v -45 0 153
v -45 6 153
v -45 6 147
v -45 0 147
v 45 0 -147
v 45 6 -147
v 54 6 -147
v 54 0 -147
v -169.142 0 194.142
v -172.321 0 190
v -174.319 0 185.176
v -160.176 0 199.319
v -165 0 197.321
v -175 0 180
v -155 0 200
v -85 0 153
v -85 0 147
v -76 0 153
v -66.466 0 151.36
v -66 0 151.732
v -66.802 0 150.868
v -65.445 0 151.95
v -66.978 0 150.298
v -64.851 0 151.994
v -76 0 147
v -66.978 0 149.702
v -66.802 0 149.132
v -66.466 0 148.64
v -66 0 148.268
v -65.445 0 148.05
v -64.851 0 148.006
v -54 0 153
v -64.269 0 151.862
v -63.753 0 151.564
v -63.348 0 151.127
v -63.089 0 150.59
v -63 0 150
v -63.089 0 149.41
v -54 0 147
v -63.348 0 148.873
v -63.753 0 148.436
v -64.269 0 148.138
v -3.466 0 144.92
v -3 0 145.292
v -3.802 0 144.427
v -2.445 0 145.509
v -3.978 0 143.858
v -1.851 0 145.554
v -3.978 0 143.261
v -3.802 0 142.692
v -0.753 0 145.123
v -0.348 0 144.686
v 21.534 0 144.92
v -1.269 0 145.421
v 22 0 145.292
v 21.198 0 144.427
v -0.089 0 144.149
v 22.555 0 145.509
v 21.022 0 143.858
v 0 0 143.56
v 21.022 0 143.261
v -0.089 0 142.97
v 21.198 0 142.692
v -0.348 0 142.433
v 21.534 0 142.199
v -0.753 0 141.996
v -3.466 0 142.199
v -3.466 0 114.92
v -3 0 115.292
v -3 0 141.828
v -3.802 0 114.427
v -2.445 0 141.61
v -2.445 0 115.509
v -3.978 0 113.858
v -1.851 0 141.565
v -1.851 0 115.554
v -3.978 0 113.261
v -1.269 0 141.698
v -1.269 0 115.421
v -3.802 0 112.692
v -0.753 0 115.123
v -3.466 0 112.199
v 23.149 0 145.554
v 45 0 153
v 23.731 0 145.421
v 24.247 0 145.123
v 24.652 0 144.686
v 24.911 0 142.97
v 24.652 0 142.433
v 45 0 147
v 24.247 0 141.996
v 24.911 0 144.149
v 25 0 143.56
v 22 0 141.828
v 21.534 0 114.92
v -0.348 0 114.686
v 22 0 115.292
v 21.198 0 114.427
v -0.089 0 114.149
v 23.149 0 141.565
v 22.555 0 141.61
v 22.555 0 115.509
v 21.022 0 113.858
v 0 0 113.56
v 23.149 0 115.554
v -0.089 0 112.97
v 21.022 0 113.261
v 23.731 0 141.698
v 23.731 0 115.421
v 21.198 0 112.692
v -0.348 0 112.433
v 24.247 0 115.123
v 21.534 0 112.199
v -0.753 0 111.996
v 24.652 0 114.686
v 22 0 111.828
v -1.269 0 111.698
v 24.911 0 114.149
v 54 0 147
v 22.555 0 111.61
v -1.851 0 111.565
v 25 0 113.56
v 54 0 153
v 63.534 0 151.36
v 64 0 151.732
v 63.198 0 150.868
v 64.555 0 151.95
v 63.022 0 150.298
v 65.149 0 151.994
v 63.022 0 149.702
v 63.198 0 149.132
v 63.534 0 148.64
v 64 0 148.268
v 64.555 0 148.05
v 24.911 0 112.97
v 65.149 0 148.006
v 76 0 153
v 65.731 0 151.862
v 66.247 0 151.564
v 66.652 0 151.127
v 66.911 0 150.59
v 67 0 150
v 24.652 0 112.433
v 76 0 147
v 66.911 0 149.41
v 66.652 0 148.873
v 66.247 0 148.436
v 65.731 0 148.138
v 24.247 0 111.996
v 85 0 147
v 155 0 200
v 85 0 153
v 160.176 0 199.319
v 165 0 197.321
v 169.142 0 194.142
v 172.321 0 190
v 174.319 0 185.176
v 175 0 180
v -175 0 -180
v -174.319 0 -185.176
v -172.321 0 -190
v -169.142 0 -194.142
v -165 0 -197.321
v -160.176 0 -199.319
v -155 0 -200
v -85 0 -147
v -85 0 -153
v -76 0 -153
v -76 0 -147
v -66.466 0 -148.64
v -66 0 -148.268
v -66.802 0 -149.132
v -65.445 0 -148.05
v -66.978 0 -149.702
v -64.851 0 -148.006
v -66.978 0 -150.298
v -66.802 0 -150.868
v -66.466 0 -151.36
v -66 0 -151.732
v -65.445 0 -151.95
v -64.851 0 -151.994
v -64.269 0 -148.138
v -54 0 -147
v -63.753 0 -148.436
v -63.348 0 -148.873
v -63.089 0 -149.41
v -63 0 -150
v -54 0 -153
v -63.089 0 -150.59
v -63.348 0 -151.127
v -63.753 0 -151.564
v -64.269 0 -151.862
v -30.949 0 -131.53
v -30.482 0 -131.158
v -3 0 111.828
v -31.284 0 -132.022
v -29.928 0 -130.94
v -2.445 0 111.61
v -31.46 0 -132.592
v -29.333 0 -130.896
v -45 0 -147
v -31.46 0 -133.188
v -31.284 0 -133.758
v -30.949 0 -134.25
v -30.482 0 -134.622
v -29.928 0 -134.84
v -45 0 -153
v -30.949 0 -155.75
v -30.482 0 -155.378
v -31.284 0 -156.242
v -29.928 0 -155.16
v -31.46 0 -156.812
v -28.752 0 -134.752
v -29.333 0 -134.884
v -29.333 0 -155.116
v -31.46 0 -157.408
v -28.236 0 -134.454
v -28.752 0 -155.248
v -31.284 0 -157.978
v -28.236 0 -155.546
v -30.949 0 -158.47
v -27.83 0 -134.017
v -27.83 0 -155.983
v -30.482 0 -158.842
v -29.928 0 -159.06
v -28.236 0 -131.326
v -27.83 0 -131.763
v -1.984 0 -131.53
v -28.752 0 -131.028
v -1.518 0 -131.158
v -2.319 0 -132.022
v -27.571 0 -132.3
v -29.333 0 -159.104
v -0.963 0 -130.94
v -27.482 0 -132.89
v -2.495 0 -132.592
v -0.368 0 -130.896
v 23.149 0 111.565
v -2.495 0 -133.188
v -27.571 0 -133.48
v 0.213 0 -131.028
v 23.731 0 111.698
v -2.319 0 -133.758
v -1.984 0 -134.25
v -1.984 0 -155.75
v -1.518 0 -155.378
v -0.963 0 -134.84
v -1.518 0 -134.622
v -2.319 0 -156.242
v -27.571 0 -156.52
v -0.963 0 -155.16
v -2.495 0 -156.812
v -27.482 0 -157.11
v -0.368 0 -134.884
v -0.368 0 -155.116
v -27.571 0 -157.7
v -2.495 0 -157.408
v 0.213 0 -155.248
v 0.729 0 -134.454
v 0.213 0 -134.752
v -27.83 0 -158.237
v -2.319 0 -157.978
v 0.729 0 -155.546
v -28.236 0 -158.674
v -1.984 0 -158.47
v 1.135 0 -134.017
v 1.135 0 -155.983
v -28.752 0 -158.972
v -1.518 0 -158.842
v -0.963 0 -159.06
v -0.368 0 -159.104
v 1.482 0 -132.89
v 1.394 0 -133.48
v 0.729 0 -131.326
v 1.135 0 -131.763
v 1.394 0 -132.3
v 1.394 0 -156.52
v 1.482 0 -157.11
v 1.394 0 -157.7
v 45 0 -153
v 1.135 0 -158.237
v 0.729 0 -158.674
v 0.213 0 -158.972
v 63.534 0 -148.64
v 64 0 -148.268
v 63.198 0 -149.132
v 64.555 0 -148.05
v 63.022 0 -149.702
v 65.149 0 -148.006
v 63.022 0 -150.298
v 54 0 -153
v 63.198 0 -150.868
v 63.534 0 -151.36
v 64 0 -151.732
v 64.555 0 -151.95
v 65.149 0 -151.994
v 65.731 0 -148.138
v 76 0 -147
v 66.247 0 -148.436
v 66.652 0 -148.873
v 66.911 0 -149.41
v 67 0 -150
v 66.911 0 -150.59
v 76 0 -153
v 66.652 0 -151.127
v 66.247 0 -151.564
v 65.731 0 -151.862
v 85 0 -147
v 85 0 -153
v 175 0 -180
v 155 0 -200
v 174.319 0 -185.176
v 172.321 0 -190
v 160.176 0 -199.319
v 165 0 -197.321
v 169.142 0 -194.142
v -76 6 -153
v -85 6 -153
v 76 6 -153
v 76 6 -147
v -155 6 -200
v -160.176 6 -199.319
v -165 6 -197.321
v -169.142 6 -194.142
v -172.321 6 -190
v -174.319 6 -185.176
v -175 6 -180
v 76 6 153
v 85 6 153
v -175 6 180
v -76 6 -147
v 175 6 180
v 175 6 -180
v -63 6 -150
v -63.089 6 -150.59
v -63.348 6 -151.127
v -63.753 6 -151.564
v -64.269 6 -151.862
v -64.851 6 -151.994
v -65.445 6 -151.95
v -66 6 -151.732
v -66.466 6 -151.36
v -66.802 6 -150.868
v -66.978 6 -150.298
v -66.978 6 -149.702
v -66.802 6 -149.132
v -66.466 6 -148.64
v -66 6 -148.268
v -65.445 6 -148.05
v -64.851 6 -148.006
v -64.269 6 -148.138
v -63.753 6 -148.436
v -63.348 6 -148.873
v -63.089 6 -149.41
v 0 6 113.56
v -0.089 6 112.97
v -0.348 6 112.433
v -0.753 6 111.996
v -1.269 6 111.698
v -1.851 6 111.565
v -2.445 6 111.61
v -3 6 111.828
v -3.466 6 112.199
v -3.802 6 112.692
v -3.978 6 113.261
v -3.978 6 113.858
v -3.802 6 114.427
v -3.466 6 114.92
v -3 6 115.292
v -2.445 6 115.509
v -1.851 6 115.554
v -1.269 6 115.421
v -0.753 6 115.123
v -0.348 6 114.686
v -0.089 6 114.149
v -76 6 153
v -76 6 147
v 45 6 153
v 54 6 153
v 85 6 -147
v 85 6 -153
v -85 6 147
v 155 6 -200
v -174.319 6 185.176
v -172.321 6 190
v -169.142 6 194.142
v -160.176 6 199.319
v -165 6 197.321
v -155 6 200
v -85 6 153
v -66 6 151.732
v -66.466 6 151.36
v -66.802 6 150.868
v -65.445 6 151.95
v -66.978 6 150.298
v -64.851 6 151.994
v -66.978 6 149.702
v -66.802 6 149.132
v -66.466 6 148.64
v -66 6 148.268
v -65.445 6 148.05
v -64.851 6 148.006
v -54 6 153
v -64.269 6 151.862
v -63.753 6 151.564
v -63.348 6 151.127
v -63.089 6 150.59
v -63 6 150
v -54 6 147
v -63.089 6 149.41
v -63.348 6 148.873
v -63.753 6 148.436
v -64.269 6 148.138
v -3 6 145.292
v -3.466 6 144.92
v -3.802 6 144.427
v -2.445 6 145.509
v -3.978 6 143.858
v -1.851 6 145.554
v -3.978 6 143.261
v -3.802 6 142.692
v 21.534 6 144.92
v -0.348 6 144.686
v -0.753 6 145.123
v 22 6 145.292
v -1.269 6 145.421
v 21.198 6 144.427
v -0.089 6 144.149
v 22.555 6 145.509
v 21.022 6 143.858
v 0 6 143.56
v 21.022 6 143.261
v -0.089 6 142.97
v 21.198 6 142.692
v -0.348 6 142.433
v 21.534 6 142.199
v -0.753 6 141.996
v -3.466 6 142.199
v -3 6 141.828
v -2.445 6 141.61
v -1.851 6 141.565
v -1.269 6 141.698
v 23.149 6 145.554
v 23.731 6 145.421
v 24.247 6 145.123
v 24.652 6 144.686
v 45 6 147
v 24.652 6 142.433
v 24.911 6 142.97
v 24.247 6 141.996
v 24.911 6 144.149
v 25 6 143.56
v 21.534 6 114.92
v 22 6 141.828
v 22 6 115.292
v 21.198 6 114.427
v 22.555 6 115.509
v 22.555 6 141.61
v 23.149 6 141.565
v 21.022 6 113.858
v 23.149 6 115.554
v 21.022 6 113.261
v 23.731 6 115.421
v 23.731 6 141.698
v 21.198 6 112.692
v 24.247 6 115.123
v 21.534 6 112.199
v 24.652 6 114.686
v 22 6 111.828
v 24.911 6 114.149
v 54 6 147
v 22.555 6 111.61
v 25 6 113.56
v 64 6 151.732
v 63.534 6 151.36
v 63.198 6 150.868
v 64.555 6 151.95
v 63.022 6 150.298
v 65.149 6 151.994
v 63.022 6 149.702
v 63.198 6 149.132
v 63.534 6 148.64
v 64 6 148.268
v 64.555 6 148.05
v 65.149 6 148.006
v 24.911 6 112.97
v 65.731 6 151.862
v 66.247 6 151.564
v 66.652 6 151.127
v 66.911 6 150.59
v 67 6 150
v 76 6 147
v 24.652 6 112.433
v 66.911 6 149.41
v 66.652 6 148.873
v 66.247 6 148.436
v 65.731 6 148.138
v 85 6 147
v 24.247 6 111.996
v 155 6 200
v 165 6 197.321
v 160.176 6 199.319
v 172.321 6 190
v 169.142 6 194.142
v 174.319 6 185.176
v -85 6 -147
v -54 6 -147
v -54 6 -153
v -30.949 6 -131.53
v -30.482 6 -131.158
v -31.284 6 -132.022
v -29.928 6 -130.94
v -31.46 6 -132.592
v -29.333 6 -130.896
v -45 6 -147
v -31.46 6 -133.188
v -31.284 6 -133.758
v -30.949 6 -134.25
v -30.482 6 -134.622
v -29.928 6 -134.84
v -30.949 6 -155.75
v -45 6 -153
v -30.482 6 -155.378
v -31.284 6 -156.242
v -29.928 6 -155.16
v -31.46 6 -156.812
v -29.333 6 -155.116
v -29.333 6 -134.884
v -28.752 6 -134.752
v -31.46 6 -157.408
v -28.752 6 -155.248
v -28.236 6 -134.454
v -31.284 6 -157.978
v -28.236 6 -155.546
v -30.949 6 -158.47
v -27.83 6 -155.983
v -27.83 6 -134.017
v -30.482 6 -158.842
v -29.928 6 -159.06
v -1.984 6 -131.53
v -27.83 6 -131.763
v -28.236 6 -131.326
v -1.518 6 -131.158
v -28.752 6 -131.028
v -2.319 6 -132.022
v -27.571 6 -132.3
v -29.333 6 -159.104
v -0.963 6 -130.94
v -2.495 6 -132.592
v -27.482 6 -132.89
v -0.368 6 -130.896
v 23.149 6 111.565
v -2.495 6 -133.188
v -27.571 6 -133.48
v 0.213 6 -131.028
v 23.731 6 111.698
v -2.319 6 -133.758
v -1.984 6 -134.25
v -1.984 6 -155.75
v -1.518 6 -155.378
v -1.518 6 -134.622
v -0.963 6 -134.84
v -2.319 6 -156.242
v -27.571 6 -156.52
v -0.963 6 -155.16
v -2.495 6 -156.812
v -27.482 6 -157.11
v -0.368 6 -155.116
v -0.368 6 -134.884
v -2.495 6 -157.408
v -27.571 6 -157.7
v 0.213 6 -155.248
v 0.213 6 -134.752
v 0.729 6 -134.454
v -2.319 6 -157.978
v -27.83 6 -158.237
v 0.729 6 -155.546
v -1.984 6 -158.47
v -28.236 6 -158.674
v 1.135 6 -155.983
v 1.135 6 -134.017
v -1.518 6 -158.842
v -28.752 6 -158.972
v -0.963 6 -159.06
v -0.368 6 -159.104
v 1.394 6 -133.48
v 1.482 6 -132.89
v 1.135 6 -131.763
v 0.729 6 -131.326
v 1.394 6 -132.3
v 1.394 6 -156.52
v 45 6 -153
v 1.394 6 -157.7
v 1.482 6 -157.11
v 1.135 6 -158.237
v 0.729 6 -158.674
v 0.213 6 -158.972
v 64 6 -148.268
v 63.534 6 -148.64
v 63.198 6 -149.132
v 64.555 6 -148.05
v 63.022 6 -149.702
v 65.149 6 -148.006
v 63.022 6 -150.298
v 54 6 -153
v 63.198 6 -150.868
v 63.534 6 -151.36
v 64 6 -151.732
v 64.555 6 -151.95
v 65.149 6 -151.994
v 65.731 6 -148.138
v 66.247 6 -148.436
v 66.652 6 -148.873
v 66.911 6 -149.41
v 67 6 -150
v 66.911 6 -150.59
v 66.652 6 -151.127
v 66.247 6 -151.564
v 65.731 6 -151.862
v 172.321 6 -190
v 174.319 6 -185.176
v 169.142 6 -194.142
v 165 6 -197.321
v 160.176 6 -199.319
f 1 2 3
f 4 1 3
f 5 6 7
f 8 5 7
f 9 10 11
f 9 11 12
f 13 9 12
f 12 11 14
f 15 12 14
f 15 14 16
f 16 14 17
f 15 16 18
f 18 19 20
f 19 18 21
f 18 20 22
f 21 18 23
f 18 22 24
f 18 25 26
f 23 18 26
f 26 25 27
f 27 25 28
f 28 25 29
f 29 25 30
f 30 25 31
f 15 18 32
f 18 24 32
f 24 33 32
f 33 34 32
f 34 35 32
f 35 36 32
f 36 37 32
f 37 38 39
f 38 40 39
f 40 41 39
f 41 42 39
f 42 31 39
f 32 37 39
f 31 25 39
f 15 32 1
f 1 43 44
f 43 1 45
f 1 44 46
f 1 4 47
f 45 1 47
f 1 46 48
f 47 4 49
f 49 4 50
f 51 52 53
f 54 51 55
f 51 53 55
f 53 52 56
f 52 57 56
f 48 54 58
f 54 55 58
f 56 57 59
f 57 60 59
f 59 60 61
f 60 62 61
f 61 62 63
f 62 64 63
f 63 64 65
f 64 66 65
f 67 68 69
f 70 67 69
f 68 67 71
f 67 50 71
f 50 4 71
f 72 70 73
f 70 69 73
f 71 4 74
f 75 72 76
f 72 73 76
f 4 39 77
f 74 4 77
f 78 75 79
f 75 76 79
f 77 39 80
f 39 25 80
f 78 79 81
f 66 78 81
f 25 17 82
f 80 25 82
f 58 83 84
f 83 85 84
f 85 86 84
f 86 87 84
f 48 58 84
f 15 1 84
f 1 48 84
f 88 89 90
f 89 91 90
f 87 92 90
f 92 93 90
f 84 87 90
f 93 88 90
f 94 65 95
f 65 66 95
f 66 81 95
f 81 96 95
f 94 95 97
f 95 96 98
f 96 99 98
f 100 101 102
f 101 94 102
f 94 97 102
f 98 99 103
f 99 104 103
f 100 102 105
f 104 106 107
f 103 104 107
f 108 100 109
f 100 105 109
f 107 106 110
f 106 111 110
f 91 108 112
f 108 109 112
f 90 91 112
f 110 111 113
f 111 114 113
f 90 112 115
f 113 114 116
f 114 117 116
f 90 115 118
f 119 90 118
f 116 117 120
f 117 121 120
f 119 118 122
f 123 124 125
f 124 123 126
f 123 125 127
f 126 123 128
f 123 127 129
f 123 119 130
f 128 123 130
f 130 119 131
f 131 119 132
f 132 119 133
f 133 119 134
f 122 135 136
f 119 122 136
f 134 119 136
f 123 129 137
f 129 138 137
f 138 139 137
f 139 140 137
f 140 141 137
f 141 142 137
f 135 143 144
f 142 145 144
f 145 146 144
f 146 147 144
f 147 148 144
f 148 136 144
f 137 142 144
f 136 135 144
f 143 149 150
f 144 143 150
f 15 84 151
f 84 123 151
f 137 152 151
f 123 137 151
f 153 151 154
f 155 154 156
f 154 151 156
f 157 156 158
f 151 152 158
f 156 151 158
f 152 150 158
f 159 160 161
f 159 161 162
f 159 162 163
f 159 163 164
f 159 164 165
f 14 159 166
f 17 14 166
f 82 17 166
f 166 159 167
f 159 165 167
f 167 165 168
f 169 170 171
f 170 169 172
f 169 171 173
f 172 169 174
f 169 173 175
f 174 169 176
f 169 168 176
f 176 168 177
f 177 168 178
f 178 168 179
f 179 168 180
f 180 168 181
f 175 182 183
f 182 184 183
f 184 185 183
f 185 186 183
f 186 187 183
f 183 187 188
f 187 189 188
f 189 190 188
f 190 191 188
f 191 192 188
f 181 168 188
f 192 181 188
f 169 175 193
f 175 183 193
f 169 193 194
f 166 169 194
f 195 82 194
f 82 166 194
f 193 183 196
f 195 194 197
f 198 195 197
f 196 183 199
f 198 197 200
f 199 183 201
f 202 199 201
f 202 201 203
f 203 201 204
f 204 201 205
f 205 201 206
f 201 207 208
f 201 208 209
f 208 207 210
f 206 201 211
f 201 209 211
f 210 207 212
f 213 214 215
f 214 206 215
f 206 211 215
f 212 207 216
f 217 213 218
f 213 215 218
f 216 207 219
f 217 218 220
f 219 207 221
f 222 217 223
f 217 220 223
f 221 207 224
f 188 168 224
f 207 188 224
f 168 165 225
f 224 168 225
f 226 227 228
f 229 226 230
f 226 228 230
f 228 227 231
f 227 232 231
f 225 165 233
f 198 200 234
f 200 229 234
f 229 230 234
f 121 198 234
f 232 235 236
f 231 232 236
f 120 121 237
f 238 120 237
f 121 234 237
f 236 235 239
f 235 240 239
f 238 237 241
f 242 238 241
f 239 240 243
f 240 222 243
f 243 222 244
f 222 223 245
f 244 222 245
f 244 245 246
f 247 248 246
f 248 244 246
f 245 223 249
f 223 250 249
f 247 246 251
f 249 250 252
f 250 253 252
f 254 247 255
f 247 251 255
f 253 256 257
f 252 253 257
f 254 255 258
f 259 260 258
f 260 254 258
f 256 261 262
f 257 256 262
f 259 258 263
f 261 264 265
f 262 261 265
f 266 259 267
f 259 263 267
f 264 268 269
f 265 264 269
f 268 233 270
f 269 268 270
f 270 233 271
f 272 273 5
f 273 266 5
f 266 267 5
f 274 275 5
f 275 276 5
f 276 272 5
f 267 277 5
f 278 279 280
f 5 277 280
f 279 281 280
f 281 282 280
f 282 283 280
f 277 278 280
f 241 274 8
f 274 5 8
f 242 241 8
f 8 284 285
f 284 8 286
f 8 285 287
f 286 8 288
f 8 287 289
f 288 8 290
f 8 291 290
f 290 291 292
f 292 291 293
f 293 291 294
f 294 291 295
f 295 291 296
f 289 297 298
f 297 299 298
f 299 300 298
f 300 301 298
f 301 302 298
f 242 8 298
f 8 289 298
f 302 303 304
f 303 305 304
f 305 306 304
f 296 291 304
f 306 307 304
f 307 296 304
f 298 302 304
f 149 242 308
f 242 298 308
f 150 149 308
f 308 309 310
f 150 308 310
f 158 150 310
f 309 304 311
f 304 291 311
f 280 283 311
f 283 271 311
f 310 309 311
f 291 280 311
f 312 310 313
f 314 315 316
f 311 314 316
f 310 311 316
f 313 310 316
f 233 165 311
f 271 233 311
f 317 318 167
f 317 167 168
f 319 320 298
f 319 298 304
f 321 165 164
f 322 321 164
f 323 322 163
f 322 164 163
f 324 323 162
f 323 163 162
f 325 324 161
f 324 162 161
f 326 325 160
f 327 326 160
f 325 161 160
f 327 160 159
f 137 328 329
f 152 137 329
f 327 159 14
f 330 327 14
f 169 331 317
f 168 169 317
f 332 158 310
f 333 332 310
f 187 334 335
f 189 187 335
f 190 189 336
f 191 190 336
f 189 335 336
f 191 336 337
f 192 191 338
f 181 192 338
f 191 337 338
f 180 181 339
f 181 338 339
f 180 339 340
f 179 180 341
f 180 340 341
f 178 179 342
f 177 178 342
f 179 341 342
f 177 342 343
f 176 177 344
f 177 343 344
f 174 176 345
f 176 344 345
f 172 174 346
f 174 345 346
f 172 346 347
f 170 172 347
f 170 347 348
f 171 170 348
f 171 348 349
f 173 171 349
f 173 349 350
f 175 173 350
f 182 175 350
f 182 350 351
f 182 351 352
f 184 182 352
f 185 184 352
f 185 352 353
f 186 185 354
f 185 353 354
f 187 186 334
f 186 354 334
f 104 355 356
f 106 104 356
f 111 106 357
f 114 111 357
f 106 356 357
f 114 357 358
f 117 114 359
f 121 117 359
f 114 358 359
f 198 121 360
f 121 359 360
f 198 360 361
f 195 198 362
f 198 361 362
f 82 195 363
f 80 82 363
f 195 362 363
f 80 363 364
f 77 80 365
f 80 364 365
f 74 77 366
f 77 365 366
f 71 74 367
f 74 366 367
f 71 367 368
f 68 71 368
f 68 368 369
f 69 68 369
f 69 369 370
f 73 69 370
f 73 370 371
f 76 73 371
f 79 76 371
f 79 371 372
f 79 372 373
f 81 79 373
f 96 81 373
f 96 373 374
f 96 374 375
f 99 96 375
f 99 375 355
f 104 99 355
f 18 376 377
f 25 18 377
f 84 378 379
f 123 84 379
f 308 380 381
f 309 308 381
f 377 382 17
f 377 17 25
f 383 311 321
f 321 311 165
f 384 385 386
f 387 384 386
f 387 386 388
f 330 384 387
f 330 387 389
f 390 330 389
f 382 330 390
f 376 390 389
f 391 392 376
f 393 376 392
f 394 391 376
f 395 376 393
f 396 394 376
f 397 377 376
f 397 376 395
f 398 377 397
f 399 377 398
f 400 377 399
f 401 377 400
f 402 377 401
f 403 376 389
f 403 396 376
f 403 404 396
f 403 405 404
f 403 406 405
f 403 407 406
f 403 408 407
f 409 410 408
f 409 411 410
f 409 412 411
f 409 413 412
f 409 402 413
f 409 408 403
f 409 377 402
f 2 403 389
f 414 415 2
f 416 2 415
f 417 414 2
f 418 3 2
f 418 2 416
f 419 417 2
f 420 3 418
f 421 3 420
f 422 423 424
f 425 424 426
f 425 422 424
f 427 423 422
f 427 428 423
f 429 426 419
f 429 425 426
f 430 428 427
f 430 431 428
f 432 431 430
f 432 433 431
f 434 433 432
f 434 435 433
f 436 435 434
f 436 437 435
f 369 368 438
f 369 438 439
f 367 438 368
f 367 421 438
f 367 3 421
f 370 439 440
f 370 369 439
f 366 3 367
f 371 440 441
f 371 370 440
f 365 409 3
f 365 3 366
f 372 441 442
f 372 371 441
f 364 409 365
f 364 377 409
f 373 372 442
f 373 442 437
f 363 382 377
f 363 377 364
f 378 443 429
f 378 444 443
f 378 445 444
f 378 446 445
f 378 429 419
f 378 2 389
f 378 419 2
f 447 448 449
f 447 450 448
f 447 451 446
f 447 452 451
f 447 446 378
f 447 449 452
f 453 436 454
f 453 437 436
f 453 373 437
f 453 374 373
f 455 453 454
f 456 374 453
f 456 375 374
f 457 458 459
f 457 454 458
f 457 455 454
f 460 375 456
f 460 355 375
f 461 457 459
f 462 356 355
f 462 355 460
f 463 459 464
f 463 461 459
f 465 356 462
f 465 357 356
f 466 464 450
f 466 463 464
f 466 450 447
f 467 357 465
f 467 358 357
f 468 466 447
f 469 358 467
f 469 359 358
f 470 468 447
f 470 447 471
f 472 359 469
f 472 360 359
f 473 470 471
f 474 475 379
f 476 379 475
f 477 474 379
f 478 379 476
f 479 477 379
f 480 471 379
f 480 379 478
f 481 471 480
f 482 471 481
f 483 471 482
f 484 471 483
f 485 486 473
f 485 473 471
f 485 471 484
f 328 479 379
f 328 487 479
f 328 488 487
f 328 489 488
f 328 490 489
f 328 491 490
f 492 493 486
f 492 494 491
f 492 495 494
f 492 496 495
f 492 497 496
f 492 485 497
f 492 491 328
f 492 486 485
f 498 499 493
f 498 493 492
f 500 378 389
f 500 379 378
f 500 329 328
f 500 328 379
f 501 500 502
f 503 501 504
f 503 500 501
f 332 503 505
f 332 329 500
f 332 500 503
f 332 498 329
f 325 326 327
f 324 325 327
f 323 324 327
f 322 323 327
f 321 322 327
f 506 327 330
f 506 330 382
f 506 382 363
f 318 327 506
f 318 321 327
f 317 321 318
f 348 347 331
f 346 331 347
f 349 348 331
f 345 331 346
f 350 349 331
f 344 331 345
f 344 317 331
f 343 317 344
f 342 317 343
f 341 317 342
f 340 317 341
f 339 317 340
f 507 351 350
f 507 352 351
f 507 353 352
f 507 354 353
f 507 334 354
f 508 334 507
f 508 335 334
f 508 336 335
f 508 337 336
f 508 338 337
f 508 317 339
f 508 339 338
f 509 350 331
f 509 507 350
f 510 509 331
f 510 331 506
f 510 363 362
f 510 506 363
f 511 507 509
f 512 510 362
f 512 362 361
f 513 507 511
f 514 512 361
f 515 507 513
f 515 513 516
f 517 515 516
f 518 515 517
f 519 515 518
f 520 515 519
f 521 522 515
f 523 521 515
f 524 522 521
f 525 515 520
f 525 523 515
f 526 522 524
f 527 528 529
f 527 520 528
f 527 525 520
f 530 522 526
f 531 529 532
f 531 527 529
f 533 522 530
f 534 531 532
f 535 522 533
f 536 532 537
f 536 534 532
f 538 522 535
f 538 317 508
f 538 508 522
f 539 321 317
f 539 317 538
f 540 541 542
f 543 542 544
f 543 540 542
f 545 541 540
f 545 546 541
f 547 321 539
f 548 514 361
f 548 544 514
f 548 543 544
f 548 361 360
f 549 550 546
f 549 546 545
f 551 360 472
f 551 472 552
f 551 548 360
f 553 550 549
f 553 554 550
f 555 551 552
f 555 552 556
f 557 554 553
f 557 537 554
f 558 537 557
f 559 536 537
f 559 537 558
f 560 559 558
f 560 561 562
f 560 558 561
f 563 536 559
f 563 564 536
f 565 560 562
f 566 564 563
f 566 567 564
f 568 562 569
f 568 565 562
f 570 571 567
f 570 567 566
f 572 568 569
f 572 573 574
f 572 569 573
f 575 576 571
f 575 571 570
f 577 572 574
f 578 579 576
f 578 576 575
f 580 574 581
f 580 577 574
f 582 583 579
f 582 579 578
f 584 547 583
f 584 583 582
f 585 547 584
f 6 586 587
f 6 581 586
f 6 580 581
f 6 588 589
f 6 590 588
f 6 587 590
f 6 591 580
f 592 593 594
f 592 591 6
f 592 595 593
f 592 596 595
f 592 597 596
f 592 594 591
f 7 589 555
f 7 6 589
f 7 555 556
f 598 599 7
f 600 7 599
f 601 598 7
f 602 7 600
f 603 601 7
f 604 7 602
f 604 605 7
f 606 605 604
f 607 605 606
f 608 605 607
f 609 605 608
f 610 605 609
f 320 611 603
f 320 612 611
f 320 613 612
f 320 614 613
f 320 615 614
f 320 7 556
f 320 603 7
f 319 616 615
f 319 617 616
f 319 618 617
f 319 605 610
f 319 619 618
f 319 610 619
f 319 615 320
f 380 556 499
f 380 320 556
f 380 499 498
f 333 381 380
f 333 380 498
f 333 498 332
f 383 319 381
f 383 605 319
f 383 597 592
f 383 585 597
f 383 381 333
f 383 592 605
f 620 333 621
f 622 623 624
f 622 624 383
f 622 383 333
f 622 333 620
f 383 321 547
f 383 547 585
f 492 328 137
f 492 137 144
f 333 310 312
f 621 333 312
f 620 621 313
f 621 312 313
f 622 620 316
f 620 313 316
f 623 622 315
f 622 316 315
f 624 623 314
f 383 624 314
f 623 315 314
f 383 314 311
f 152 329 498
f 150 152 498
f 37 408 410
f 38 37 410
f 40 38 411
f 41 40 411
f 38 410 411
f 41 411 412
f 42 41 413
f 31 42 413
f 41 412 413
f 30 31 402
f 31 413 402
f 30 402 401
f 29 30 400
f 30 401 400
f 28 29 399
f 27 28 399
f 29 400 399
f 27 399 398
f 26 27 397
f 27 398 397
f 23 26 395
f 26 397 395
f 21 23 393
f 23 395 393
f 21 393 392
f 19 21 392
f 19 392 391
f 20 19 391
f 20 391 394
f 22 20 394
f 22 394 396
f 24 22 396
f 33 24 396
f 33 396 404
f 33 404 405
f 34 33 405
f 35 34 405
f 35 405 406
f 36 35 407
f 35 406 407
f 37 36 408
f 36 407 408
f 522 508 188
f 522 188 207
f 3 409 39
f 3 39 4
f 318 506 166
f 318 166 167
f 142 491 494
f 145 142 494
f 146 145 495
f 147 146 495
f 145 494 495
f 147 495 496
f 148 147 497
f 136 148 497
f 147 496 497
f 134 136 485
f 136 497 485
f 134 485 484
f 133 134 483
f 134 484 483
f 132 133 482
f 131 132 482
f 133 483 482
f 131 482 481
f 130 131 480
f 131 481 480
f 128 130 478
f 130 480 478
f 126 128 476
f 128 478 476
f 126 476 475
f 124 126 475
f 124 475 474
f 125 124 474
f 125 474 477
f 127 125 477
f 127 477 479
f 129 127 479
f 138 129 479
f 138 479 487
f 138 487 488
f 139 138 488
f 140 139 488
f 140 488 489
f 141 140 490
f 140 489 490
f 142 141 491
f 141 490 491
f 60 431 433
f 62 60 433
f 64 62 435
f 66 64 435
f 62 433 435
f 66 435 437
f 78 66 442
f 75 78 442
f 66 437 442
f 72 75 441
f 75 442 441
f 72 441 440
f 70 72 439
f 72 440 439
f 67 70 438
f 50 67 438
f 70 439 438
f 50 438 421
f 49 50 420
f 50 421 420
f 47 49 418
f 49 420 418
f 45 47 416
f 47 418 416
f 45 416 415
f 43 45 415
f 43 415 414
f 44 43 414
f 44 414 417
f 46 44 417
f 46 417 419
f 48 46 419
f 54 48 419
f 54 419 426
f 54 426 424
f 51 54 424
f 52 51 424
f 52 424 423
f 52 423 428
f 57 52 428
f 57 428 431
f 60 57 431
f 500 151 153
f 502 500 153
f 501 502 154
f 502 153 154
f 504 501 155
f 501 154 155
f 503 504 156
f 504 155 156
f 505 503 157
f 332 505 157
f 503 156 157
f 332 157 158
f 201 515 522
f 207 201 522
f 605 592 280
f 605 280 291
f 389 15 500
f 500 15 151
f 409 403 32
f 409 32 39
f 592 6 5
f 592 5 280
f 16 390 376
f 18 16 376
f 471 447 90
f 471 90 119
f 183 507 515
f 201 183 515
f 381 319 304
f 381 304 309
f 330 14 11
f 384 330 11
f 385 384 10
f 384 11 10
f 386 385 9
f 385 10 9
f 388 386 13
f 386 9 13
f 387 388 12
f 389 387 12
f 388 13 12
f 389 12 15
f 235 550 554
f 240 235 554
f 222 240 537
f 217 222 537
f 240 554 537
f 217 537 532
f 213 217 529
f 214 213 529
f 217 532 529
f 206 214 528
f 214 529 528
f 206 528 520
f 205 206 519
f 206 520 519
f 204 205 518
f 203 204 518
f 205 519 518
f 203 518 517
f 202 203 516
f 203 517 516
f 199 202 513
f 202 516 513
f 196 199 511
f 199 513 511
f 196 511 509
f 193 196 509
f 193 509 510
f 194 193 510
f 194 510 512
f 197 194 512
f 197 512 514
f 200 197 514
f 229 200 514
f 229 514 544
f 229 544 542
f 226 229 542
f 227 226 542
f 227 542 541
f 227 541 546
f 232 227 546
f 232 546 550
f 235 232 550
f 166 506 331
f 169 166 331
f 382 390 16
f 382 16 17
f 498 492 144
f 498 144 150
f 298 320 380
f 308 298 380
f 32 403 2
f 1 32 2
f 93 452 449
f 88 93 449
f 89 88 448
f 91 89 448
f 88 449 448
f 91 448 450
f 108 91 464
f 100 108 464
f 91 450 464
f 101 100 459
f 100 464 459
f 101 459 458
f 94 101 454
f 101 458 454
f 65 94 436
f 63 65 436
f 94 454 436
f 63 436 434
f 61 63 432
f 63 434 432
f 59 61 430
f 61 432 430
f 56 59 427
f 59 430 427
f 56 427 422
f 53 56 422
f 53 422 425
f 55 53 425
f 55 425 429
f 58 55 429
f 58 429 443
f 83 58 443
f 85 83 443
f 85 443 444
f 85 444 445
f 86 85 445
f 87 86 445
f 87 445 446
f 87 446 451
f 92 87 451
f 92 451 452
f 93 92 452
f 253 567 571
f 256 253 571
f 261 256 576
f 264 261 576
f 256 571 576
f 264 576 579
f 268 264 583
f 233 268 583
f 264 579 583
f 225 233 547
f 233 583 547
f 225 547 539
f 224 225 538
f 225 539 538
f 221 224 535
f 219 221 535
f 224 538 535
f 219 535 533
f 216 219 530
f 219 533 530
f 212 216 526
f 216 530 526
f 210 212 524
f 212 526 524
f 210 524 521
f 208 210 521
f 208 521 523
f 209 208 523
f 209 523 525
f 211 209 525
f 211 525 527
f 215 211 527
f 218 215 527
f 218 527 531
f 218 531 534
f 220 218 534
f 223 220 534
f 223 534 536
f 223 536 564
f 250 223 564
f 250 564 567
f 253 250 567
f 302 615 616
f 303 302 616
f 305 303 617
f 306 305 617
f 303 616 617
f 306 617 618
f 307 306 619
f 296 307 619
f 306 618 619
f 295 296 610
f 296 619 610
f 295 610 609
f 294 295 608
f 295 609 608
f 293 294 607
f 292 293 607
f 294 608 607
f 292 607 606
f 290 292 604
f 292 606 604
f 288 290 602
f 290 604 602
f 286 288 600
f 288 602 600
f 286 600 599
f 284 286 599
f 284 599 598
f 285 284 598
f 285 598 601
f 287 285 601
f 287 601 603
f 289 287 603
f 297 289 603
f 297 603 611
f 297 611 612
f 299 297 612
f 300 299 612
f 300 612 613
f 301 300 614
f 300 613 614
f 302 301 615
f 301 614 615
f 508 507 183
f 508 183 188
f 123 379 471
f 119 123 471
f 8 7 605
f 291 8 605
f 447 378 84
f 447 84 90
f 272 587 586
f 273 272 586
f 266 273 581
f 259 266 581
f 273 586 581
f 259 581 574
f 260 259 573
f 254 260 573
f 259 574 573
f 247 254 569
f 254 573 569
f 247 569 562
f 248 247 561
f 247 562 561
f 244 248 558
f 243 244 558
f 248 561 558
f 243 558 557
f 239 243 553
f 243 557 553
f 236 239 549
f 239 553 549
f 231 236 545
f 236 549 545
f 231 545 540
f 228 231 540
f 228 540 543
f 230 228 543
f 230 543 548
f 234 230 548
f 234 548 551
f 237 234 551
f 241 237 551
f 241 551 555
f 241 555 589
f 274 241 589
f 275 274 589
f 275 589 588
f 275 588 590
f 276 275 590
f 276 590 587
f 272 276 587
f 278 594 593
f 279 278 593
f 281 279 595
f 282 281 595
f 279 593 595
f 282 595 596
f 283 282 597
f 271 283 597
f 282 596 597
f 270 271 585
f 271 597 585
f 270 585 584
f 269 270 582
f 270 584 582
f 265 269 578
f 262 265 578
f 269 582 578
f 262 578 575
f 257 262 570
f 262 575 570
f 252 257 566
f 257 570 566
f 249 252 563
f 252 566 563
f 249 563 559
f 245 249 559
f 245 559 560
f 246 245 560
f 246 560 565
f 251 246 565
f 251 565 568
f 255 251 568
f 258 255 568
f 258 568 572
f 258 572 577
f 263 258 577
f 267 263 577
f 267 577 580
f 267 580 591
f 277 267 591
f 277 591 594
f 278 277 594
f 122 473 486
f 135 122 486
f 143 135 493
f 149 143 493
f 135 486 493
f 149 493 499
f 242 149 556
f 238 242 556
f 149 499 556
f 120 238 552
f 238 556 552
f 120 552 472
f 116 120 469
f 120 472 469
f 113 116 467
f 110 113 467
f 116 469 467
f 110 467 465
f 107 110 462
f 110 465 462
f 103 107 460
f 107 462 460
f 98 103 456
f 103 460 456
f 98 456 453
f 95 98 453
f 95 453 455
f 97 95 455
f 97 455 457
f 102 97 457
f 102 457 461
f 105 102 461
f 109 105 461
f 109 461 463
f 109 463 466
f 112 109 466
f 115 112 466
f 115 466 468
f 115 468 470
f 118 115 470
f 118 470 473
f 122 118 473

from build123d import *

# Parameters (mm, degrees)
BOSS_EXTRUDE1_DEPTH = 6
SKETCH2_R           = 2
CUT_EXTRUDE1_DEPTH  = 10
SKETCH3_R           = 2
SKETCH3_W           = 9
SKETCH3_H           = 6
CUT_EXTRUDE5_DEPTH  = 6
SKETCH4_R           = 2
CUT_EXTRUDE6_DEPTH  = 24


with BuildPart() as part:
    # Sketch1 → Boss-Extrude1 (new body)
    with BuildSketch(Plane(origin=(0, 0, 0), x_dir=(1, 0, 0), z_dir=(0, 1, 0))):
        with BuildLine():
            Line((-155, -200), (155, -200))
            ThreePointArc((155, -200), (169.142135624, -194.142135624), (175, -180))
            Line((175, -180), (175, 180))
            ThreePointArc((175, 180), (169.142135624, 194.142135624), (155, 200))
            Line((155, 200), (-155, 200))
            ThreePointArc((-155, 200), (-169.142135624, 194.142135624), (-175, 180))
            Line((-175, 180), (-175, -180))
            ThreePointArc((-175, -180), (-169.142135624, -194.142135624), (-155, -200))
        make_face()
    extrude(amount=BOSS_EXTRUDE1_DEPTH)

    # Sketch2 → Cut-Extrude1 (cut)
    with BuildSketch(Plane(origin=(0, 6, 0), x_dir=(1, 0, 0), z_dir=(0, 1, 0))):
        with Locations((-2, -113.559557499)):
            Circle(SKETCH2_R)
        with Locations((23, -113.559557499)):
            Circle(SKETCH2_R)
        with Locations((23, -143.559557499)):
            Circle(SKETCH2_R)
        with Locations((-2, -143.559557499)):
            Circle(SKETCH2_R)
    extrude(amount=-CUT_EXTRUDE1_DEPTH, mode=Mode.SUBTRACT)

    # Sketch3 → Cut-Extrude5 (cut)
    with BuildSketch(Plane(origin=(0, 6, 0), x_dir=(1, 0, 0), z_dir=(0, 1, 0))):
        with Locations((-65, 150)):
            Circle(SKETCH3_R)
        with Locations((65, 150)):
            Circle(SKETCH3_R)
        with Locations((65, -150)):
            Circle(SKETCH3_R)
        with Locations((-65, -150)):
            Circle(SKETCH3_R)
        with Locations((-49.5, 150)):
            Rectangle(SKETCH3_W, SKETCH3_H)
        with Locations((-80.5, 150)):
            Rectangle(SKETCH3_W, SKETCH3_H)
        with Locations((49.5, 150)):
            Rectangle(SKETCH3_W, SKETCH3_H)
        with Locations((80.5, 150)):
            Rectangle(SKETCH3_W, SKETCH3_H)
        with Locations((80.5, -150)):
            Rectangle(SKETCH3_W, SKETCH3_H)
        with Locations((49.5, -150)):
            Rectangle(SKETCH3_W, SKETCH3_H)
        with Locations((-49.5, -150)):
            Rectangle(SKETCH3_W, SKETCH3_H)
        with Locations((-80.5, -150)):
            Rectangle(SKETCH3_W, SKETCH3_H)
    extrude(amount=-CUT_EXTRUDE5_DEPTH, mode=Mode.SUBTRACT)

    # Sketch4 → Cut-Extrude6 (cut)
    with BuildSketch(Plane(origin=(0, 6, 0), x_dir=(1, 0, 0), z_dir=(0, 1, 0))):
        with Locations((-29.4825, 157.11)):
            Circle(SKETCH4_R)
        with Locations((-0.5175, 157.11)):
            Circle(SKETCH4_R)
        with Locations((-0.5175, 132.89)):
            Circle(SKETCH4_R)
        with Locations((-29.4825, 132.89)):
            Circle(SKETCH4_R)
    extrude(amount=-CUT_EXTRUDE6_DEPTH, mode=Mode.SUBTRACT)


solid = part.part
